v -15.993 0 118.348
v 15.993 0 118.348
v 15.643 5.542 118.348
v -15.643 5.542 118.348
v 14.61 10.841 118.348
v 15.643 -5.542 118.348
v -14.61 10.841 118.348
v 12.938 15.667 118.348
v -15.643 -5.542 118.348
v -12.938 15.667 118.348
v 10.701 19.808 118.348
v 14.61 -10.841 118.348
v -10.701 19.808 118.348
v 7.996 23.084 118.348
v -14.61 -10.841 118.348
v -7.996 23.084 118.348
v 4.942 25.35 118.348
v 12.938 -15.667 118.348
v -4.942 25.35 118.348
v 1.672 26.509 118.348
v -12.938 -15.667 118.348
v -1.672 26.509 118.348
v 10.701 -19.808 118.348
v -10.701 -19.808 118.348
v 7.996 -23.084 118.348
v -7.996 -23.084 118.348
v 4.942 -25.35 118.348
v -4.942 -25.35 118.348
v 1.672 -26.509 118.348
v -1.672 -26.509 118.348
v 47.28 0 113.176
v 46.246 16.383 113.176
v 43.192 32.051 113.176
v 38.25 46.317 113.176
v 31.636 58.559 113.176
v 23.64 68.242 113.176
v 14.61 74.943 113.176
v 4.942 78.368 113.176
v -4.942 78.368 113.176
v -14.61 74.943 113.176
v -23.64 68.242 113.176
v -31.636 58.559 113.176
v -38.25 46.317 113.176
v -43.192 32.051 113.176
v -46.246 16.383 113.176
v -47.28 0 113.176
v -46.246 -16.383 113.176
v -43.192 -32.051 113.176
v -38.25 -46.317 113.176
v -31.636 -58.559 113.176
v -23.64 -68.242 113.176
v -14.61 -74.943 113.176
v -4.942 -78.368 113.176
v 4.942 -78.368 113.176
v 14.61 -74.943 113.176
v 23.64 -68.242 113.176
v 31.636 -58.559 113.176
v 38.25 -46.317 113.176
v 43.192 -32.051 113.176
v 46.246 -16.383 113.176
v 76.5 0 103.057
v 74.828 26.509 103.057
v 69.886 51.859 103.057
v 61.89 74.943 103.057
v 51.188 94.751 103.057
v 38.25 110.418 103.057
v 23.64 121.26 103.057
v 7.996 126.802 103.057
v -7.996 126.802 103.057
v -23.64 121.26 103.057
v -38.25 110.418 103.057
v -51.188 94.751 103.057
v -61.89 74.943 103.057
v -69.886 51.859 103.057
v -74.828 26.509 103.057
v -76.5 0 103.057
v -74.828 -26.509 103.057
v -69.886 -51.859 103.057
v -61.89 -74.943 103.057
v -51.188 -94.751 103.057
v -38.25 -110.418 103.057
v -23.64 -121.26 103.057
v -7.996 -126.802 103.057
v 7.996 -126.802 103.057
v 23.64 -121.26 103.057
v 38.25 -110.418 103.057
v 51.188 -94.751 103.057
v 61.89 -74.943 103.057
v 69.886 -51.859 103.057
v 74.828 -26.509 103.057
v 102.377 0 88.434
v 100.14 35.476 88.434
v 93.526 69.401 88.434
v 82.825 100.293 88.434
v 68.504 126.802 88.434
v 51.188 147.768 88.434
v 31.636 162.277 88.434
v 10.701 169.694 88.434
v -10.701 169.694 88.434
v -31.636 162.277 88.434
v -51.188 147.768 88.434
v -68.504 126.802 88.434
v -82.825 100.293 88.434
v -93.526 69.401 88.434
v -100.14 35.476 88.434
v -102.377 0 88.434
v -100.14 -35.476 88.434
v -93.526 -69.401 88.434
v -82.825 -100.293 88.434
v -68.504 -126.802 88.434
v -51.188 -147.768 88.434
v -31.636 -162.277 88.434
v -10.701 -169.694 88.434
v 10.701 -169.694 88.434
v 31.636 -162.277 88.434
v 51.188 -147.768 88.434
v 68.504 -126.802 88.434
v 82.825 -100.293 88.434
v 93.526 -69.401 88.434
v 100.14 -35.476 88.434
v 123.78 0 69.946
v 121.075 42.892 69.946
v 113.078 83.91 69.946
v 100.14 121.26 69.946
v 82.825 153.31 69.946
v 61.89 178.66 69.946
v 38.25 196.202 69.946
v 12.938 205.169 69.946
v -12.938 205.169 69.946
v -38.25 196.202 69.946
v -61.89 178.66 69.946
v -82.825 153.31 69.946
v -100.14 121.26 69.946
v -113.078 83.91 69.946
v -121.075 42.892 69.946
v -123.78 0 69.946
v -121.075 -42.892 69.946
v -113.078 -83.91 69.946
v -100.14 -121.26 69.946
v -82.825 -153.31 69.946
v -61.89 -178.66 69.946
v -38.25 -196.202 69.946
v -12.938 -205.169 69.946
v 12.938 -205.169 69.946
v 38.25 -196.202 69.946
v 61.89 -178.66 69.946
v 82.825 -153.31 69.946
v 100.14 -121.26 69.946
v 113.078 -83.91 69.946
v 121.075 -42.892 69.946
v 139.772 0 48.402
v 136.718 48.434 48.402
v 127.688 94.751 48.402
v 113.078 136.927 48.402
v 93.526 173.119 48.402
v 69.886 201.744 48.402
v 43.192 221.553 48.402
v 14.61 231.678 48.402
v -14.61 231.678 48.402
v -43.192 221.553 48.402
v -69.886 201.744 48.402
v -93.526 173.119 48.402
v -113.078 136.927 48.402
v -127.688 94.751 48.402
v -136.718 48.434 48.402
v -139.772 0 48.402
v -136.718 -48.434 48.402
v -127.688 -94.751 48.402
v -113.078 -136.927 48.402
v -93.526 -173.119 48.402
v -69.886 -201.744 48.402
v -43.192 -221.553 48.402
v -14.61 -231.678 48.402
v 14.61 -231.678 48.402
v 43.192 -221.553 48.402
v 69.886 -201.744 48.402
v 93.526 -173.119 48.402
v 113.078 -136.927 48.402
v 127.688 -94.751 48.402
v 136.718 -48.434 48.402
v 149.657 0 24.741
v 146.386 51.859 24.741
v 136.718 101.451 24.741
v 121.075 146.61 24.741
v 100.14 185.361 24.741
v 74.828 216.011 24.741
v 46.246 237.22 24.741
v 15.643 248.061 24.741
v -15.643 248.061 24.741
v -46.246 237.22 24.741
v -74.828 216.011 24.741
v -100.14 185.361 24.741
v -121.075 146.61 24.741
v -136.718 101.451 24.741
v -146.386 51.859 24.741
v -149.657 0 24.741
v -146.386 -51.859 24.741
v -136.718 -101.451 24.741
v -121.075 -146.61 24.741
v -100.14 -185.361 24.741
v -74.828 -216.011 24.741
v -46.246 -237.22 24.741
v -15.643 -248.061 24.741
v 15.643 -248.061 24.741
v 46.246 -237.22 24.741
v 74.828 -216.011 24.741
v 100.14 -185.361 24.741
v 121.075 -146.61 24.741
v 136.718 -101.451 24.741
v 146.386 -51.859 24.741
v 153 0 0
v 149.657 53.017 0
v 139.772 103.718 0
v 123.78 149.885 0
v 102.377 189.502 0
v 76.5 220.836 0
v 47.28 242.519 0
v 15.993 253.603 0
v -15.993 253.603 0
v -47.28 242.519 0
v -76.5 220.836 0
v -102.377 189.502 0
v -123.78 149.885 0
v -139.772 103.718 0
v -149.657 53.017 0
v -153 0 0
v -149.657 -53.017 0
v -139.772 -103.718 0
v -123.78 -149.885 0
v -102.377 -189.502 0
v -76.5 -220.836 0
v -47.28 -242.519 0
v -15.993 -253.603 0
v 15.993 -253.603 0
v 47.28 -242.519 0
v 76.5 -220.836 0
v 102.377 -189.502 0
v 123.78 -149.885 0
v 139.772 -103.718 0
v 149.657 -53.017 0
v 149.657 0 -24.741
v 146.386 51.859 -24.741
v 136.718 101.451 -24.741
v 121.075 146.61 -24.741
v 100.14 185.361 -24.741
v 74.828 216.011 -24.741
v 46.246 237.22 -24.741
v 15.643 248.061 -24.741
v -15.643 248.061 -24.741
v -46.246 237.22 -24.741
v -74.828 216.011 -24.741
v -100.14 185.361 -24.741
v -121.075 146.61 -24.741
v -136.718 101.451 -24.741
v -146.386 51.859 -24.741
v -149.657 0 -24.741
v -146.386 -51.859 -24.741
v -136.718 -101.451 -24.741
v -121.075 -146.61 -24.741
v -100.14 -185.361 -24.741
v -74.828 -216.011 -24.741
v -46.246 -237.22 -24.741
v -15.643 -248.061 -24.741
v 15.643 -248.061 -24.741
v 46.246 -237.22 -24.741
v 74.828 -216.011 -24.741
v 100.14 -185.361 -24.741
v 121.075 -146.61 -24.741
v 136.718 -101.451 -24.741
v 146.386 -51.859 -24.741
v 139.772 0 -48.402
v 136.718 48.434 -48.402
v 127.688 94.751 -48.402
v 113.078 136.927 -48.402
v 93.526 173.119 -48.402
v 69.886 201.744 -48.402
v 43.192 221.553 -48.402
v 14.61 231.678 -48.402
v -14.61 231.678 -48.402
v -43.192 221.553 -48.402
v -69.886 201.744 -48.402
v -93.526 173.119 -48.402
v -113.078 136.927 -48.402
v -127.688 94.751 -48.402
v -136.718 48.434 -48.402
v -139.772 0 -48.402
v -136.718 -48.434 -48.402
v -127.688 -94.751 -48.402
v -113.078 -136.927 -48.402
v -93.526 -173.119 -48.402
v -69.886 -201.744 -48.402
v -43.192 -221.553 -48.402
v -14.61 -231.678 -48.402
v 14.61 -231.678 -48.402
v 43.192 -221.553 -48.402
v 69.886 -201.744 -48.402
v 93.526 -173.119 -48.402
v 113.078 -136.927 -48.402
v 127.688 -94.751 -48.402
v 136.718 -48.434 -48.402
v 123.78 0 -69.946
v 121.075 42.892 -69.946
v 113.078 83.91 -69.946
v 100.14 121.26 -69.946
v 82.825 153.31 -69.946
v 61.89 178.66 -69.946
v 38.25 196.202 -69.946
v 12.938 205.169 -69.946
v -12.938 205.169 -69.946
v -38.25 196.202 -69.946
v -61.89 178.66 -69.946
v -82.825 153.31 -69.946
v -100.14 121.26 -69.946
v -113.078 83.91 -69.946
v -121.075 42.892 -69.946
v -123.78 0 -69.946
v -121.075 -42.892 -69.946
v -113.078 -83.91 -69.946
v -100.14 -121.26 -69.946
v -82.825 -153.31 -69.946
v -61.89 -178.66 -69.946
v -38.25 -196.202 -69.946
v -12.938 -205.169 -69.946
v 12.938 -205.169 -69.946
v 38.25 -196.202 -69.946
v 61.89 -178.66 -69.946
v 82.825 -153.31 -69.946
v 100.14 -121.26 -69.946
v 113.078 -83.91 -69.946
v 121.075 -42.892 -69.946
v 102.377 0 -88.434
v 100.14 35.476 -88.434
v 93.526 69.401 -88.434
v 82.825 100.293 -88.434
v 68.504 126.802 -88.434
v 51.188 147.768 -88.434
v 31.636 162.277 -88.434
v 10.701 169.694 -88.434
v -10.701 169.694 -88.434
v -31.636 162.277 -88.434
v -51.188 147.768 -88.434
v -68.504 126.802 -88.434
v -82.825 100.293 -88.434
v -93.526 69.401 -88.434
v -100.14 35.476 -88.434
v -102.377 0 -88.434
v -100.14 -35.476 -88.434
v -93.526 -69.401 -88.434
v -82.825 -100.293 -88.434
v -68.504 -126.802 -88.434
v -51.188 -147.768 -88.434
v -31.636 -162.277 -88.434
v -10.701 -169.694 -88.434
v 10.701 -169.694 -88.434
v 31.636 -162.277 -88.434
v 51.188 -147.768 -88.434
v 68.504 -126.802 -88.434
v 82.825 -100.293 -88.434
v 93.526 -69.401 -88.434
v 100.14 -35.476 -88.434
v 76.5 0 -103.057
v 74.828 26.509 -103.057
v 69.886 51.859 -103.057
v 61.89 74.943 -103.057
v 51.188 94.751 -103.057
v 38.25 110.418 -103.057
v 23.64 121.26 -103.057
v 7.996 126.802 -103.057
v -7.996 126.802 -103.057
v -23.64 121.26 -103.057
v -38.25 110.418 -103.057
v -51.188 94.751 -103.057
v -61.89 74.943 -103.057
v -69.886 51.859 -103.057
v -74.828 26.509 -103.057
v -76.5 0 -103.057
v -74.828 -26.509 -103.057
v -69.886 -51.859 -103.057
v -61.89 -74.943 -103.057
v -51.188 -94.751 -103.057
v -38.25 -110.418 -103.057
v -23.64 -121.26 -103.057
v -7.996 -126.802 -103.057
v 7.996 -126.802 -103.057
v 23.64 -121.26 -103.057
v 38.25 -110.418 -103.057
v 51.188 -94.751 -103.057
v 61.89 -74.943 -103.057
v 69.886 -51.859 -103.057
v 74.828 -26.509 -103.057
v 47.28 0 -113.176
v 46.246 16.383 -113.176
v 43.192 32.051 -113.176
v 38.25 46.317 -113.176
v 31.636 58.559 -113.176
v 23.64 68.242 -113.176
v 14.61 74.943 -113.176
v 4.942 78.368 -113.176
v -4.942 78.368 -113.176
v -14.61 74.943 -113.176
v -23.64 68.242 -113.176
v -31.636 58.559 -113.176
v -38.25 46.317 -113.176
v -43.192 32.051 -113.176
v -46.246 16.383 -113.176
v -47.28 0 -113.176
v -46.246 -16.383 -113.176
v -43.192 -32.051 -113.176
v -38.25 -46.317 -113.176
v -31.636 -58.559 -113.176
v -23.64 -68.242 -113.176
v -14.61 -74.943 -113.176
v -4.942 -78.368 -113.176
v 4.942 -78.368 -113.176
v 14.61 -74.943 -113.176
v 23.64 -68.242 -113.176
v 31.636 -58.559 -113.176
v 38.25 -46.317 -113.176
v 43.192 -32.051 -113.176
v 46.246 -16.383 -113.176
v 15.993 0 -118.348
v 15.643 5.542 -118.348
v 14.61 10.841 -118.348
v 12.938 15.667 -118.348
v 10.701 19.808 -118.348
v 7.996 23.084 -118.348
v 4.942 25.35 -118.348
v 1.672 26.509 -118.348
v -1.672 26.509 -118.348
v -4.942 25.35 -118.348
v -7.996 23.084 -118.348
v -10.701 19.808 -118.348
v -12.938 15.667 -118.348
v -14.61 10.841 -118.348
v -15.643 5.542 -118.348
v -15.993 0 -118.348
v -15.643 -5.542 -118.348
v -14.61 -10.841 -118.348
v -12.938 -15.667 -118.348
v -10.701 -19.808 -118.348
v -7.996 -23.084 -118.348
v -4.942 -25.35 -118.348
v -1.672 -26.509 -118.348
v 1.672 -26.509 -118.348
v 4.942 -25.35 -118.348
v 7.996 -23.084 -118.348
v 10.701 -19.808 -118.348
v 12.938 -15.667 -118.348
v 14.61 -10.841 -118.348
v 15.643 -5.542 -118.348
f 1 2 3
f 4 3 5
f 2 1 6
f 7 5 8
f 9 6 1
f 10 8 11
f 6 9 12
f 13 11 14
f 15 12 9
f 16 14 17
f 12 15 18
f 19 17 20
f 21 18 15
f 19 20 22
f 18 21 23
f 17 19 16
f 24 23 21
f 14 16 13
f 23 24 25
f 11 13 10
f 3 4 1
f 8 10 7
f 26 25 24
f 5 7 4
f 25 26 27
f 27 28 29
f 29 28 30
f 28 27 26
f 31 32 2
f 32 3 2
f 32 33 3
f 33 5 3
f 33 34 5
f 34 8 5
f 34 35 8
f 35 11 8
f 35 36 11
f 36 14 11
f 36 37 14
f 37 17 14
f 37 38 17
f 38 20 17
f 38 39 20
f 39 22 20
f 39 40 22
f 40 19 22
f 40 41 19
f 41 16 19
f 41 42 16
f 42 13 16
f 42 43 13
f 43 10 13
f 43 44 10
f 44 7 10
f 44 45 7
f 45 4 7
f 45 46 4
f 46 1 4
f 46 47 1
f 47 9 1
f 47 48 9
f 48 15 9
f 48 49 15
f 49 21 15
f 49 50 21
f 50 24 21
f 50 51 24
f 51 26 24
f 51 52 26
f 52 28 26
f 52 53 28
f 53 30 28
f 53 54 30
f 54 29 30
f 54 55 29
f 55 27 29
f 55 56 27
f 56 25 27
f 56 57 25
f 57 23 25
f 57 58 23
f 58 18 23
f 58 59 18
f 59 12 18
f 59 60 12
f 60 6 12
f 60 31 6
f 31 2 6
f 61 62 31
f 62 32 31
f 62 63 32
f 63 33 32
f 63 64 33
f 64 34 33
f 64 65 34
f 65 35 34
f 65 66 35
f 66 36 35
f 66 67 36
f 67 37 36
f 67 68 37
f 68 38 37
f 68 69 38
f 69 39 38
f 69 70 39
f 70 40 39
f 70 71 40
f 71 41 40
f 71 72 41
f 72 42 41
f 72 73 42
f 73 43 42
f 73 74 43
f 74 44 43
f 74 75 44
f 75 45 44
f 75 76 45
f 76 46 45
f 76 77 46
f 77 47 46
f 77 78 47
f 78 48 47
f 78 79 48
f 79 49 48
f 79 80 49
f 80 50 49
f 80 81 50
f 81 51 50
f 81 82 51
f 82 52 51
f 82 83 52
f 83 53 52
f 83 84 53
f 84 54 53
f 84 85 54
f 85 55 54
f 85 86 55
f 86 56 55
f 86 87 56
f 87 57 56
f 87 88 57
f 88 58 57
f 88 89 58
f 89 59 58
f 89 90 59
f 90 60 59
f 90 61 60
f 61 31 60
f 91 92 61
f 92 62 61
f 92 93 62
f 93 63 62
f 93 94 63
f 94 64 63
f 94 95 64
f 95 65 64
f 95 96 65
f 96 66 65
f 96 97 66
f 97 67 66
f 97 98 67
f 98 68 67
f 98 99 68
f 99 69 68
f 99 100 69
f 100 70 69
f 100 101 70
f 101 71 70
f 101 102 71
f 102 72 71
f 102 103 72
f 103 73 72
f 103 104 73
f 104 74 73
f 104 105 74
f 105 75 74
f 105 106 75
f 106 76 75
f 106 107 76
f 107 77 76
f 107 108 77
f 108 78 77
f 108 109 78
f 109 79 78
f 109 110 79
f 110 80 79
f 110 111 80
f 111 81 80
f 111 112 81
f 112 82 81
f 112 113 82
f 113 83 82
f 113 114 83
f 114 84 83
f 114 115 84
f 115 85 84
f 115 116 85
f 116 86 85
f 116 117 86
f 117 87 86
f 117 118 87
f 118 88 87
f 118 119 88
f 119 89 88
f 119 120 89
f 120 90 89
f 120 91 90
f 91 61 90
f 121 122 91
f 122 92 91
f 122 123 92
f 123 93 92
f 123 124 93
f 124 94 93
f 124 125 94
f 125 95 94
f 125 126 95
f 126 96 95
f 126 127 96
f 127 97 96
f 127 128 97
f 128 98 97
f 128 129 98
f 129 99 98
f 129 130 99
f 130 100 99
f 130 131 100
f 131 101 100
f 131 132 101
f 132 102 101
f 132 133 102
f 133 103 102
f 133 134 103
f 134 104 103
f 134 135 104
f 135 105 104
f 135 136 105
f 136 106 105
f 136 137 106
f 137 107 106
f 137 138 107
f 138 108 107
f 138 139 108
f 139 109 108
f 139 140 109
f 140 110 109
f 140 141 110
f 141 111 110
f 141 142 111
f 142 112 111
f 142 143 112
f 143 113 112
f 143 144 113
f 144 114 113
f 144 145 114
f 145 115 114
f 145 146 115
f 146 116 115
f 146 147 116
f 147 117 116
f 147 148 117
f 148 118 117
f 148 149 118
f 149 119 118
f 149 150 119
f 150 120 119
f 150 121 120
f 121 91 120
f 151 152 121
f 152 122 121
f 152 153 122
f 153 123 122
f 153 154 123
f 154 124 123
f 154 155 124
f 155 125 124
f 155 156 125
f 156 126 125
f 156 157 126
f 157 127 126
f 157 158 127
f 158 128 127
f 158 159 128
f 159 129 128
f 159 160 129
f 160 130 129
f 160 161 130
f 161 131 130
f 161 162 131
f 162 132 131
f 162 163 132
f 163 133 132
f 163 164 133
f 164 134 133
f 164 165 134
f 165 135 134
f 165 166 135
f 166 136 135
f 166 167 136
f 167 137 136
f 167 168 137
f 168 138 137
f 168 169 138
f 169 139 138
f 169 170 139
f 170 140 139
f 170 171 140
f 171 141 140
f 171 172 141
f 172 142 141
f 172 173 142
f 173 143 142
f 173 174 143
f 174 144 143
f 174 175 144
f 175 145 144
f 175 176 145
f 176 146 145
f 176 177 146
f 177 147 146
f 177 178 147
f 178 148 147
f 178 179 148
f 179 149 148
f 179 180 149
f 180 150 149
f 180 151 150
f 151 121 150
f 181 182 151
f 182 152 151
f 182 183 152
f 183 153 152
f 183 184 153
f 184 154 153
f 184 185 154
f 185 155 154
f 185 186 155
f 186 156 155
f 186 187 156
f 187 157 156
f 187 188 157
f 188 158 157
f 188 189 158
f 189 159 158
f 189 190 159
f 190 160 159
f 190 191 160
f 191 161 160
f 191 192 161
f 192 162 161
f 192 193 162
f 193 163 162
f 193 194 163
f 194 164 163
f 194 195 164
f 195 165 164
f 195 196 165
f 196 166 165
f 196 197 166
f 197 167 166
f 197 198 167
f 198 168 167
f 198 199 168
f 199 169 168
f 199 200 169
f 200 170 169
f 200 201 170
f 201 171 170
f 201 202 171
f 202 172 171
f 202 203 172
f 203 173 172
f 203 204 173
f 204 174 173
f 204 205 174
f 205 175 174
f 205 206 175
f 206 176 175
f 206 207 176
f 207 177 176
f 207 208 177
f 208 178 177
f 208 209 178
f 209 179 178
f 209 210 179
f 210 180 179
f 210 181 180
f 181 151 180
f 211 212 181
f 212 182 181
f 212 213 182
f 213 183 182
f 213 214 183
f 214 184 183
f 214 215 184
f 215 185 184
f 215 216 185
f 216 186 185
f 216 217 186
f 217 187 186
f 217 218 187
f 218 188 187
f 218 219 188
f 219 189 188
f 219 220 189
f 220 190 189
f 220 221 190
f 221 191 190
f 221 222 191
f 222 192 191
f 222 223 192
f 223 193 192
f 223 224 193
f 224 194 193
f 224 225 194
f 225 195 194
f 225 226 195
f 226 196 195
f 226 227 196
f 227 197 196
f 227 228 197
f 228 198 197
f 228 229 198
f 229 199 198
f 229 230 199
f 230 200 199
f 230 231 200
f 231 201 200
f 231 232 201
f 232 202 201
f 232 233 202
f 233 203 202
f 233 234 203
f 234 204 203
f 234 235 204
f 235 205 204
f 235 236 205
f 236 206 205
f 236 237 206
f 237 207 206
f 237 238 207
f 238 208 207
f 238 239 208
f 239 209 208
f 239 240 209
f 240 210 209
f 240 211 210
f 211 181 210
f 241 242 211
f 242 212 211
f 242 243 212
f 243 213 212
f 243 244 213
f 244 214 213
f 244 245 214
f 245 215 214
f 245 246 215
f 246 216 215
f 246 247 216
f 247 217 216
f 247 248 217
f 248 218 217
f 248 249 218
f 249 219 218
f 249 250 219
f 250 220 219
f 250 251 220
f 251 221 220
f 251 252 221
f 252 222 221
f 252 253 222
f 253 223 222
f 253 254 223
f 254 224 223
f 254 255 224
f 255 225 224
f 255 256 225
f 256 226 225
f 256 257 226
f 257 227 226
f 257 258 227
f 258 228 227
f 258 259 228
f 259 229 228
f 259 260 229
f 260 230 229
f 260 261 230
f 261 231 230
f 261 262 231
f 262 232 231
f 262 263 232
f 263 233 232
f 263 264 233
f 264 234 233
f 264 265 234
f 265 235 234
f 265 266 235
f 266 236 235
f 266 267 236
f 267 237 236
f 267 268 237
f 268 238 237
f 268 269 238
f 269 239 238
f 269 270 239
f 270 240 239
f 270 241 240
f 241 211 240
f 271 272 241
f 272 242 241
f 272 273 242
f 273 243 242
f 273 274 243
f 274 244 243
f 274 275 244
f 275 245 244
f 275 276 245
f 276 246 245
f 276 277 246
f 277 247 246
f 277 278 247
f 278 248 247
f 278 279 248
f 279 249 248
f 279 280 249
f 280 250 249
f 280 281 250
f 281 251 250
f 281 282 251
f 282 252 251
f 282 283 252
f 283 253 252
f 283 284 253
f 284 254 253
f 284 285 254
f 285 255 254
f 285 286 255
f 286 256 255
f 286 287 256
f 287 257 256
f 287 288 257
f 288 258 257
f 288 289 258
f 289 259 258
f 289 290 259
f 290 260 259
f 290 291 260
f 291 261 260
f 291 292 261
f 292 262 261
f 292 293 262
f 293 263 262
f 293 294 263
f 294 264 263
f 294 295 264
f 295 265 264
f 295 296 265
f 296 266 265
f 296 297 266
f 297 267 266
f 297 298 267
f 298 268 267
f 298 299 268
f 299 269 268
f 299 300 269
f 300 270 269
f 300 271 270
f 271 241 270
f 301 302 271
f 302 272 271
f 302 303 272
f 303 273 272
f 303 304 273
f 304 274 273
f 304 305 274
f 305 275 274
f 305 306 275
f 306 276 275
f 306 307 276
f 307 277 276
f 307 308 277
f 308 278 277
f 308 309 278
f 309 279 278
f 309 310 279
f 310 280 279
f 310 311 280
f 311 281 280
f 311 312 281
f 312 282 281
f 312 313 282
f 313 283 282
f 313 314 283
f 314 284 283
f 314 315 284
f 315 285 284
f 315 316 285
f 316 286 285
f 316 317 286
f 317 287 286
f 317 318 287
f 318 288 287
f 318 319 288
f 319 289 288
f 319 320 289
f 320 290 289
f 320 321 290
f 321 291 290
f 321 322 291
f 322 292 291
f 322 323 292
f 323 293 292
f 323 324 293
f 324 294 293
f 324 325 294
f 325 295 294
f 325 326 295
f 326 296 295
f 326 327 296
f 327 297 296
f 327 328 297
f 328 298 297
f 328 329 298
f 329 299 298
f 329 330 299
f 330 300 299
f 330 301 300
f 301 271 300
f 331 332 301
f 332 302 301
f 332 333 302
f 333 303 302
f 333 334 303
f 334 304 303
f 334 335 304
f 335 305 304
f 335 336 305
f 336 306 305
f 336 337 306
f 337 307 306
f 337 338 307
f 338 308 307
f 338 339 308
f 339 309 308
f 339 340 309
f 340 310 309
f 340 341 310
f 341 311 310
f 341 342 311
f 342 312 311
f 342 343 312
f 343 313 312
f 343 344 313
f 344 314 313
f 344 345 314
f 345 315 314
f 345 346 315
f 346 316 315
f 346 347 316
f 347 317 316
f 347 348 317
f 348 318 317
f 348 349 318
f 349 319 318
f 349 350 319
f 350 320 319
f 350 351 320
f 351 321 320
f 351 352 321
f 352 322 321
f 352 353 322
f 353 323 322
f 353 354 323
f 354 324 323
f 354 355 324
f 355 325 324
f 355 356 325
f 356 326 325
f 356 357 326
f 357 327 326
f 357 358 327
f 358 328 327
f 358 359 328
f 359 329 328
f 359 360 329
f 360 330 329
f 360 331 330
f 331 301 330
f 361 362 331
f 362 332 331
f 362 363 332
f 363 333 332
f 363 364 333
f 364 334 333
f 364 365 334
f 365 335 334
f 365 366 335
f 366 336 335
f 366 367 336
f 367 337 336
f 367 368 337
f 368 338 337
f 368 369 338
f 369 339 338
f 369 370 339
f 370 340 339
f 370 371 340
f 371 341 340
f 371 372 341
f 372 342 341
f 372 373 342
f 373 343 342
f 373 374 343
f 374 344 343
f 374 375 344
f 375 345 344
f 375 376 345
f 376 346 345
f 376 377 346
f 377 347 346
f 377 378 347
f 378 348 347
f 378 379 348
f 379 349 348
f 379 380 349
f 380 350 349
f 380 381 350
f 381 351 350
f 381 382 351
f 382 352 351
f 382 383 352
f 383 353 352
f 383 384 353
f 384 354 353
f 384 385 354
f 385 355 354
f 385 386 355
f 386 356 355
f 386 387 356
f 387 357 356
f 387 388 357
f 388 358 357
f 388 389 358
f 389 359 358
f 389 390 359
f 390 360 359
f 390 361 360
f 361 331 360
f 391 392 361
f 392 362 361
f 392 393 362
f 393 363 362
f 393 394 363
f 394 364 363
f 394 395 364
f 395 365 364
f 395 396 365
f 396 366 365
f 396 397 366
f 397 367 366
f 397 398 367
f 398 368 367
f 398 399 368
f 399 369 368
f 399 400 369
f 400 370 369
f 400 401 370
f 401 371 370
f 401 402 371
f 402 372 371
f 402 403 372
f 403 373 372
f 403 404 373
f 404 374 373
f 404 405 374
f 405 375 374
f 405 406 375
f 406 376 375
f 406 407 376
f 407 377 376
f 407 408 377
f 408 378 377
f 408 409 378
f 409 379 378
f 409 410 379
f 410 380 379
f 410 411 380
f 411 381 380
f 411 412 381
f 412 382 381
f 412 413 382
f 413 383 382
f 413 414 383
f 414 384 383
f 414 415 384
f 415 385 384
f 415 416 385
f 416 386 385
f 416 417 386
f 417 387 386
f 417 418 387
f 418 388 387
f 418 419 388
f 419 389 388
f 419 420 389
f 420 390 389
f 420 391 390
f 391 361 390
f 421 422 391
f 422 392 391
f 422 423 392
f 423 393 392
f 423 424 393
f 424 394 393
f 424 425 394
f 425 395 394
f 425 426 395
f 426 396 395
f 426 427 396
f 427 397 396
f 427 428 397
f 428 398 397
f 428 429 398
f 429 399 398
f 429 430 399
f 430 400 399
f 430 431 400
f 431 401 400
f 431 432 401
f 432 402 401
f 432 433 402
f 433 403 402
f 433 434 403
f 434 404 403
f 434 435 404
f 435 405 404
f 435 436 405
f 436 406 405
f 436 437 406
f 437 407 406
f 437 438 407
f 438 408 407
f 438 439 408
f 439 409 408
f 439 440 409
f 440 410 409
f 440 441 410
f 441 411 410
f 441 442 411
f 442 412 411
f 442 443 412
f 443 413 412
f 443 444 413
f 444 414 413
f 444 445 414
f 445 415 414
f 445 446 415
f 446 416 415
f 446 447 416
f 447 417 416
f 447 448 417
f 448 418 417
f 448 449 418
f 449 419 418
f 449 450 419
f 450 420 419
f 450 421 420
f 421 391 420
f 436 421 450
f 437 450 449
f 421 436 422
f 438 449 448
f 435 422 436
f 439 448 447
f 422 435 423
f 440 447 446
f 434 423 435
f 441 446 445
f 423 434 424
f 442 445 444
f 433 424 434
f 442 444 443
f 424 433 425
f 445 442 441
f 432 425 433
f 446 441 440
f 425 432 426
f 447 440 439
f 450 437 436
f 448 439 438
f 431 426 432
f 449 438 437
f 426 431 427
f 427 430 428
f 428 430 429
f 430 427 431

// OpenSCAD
// Generated by SolidPython 1.0.1 on 2020-07-29 00:46:49


scale(v = [9, 15, 7]) {
	sphere(r = 17);
}
/***********************************************
*********      SolidPython code:      **********
************************************************
 
# import packages: SolidPython
from solid import *
from solid.utils import *
from itertools import chain, combinations, permutations


class Resize:

    def __init__(self, scad_file):
        self.scad_file = scad_file
        #self.scad_file = import_scad(scad_file)
        # cone/cylinder param:
        self.r1 = 0
        self.r2 = 0
        self.h = 0
        # rectangular prism param:
        self.w = 0
        self.l = 0
        # ellipse param:
        self.r = 0

    # import OpenScad code (file name corresponds to shape)


    # classify shape + parameters
    def assign(self, param1, param2, param3):
        if self.scad_file == 'cone.scad':
            self.r1 = param1
            self.r2 = param2
            self.h = param3
        elif self.scad_file == 'cylinder.scad':
            self.r1 = param1
            self.r2 = param2
            self.h = param3
        elif self.scad_file == 'rectangularPrism.scad':
            self.h = param1
            self.l = param2
            self.w = param3
        else:
            self.r = param1
            self.h = param2

    # resize parameters
    def iterate(self):
        x = range(3, 20, 2)
        i = 1
        if self.scad_file == 'cone.scad':
            tempList = list(permutations(x, 2))
            for temp in tempList:
                param1 = temp[0]
                param2 = temp[1]
                filepath = 'produced_scad_files/' + 'cone' + str(param1) + '_' + str(param2) + '_' + '.scad'
                scad_render_to_file(cylinder(h=param1, r1=param2, r2=0), filepath)

        elif self.scad_file == 'cylinder.scad':
            tempList = list(permutations(x, 3))
            for temp in tempList:
                param1 = temp[0]
                param2 = temp[1]
                filepath = 'produced_scad_files/' + 'cylinder' + str(param1) + '_' + str(param2) + '_' + '.scad'
                scad_render_to_file(cylinder(h=param1, r1=param2, r2=param2), filepath)

        elif self.scad_file == 'rectangularPrism.scad':
            tempList = list(permutations(x, 3))
            for temp in tempList:
                param1 = temp[0]
                param2 = temp[1]
                param3 = temp[2]
                filepath = 'produced_scad_files/' + 'rectangularPrism' + str(param1) + '_' + str(param2) + '_' + str(
                    param3) + '.scad'
                scad_render_to_file(cube(size=(param1, param2, param3)), filepath)

        elif self.scad_file == 'ellipse.scad':
            tempList = list(permutations(x, 4))
            for temp in tempList:
                param1 = temp[0]
                param2 = temp[1]
                param3 = temp[2]
                param4 = temp[3]
                filepath = 'produced_scad_files/' + 'ellipse' + str(param1) + '_' + str(param2) + '_' + str(param3) + '_' + str(param4) + '.scad'
                scad_render_to_file(scale([param1, param2, param3])(sphere(r=param4)), filepath)

    def render_to_scadfile(self):
        scad_render_to_file(scad, 'example.scad') 
 
************************************************/
